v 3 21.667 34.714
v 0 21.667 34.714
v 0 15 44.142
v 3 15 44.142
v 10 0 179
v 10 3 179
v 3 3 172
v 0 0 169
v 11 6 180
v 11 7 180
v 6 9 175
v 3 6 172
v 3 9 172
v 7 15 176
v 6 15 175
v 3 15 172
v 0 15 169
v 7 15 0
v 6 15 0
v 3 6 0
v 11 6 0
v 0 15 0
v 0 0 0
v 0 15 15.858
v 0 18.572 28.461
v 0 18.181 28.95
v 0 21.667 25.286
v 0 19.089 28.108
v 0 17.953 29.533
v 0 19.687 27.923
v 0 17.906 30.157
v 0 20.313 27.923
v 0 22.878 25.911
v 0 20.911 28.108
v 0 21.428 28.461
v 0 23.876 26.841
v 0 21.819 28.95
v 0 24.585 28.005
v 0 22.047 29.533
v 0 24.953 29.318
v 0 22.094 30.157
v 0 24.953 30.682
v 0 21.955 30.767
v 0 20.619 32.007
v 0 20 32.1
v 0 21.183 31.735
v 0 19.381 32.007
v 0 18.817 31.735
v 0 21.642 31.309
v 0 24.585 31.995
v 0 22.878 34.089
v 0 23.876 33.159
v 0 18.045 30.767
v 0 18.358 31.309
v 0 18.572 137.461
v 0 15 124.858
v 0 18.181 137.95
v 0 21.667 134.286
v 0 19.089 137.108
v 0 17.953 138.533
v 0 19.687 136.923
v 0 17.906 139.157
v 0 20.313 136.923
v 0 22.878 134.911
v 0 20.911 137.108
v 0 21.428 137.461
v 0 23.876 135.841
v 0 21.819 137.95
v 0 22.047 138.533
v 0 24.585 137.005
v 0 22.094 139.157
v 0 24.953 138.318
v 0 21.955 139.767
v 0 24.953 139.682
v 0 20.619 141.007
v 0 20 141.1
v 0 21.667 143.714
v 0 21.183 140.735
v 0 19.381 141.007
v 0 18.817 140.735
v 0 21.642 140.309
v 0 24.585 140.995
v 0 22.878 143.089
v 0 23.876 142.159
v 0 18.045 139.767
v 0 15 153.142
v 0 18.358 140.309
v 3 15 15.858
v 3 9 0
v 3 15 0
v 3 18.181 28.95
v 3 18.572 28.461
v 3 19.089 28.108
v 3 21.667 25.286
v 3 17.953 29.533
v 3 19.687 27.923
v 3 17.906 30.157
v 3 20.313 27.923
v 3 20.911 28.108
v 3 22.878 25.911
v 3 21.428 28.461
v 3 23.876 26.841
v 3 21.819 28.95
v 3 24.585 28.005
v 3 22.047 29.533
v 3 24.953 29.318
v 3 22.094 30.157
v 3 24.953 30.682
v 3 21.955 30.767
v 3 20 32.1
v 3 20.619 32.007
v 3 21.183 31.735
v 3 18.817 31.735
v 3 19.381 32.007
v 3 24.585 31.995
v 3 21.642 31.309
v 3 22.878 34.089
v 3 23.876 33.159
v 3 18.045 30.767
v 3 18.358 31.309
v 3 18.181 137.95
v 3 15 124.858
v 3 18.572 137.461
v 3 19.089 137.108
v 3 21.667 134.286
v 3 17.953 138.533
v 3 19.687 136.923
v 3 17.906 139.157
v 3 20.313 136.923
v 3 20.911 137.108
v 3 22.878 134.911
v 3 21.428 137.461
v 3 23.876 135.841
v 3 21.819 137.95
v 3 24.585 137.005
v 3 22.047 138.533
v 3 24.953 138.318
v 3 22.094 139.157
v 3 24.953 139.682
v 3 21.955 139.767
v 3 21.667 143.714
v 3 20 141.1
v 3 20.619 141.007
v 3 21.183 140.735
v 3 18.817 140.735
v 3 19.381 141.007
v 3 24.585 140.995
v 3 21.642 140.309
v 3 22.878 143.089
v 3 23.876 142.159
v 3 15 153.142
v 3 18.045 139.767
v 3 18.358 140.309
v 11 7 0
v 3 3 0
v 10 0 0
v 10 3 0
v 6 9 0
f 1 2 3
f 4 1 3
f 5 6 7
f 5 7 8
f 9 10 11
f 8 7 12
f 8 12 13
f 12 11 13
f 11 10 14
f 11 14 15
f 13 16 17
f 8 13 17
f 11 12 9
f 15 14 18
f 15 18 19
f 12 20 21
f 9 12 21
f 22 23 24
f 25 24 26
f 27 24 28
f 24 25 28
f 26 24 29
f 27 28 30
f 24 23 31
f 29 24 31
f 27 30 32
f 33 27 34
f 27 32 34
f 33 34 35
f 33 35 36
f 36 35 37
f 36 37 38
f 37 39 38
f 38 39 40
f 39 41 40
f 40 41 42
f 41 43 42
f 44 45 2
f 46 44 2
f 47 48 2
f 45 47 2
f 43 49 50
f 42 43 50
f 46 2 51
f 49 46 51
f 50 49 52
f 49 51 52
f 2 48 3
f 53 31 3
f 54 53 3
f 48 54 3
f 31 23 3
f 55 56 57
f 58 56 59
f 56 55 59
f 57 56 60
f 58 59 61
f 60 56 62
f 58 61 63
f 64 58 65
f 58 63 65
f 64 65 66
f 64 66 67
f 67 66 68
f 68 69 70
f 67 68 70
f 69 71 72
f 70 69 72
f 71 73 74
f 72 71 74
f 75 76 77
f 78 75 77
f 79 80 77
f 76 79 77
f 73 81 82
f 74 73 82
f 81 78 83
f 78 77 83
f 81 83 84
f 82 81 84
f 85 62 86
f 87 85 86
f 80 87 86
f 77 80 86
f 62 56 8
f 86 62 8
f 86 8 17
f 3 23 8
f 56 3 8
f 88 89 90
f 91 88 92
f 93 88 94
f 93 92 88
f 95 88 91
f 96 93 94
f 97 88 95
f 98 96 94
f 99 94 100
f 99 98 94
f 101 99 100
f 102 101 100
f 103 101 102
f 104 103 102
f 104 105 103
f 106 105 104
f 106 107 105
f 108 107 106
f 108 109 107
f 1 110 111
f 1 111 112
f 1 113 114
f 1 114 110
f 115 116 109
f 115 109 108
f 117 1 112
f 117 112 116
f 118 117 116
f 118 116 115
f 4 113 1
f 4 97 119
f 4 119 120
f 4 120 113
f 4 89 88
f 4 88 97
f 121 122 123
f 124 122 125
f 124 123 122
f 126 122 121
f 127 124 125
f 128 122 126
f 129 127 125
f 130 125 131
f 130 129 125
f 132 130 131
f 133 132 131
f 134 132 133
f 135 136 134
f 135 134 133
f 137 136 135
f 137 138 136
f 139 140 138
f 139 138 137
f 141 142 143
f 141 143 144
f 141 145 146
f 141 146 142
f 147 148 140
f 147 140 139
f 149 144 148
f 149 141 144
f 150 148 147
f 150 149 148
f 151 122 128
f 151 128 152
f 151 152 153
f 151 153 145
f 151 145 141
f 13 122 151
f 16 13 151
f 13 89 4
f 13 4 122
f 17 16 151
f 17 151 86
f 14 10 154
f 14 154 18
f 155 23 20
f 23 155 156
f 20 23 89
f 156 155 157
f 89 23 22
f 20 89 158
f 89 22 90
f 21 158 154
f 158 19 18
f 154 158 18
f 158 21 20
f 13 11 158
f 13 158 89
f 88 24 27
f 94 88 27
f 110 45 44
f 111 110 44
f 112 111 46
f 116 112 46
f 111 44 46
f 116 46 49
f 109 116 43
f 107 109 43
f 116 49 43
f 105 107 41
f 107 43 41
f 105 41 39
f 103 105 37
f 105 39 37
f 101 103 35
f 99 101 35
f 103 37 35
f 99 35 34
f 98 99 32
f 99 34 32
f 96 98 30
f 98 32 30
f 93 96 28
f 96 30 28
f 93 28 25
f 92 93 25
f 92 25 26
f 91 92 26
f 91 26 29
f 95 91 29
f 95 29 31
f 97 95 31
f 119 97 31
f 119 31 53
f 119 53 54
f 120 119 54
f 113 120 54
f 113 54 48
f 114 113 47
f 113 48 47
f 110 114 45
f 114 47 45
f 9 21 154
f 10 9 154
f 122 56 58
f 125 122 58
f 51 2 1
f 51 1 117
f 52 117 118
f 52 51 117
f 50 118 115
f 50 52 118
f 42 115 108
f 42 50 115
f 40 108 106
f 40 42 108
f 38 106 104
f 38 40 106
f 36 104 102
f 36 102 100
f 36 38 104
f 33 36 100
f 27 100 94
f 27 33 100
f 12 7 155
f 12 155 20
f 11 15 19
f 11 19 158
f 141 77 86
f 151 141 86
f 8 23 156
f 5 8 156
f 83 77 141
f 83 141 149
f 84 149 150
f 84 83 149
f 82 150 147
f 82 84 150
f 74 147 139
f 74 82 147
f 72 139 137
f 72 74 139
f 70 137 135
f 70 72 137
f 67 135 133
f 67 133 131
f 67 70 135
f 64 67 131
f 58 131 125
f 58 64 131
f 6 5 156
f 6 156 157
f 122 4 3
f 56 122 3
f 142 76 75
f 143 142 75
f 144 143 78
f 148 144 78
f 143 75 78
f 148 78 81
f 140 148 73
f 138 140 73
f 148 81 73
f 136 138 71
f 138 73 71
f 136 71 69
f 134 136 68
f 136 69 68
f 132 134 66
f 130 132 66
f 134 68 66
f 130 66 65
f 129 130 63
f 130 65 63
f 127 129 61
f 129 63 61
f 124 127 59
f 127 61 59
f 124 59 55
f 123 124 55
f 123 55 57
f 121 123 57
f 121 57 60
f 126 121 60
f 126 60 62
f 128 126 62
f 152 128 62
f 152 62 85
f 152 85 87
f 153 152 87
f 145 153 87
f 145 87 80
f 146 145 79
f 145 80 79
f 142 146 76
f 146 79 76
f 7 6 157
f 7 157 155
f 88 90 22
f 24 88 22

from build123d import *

# Parameters (mm, degrees)
DODANIE_WYCI_GNI_CIE1_DEPTH = 180
WYTNIJ_WYCI_GNI_CIE1_DEPTH  = 181.958558792
SZKIC3_R                    = 2.1
DODANIE_WYCI_GNI_CIE2_DEPTH = 3
SFAZOWANIE1_DEPTH           = 3


with BuildPart() as part:
    # Szkic1 → Dodanie-wyciągnięcie1 (new body)
    with BuildSketch(Plane.XY):
        Polygon((0, 0), (10, 0), (10, 3), (3, 3), (3, 6), (11, 6), (11, 7), (7, 15), (6, 15), (6, 9), (3, 9), (3, 15), (0, 15), align=None)
    extrude(amount=DODANIE_WYCI_GNI_CIE1_DEPTH)

    # Szkic2 → Wytnij-wyciągnięcie1 (cut, through all)
    with BuildSketch(Plane(origin=(0, 15, 0), x_dir=(1, 0, 0), z_dir=(0, 1, 0))):
        Polygon((0, -180), (11, -180), (0, -169), align=None)
    extrude(amount=-WYTNIJ_WYCI_GNI_CIE1_DEPTH, mode=Mode.SUBTRACT)

    # Szkic3 → Dodanie-wyciągnięcie2 (add)
    # profile 1 of 2: a face of its own
    with BuildSketch(Plane.ZY):
        with BuildLine():
            Line((25, 20), (25, 11.336506418))
            Line((25, 11.336506418), (35, 11.336506418))
            Line((35, 11.336506418), (35, 20))
            ThreePointArc((35, 20), (30, 25), (25, 20))
        make_face()
        with Locations((30, 20)):
            Circle(SZKIC3_R, mode=Mode.SUBTRACT)
    # profile 2 of 2: a face of its own
    with BuildSketch(Plane.ZY):
        with BuildLine():
            Line((134, 20), (134, 11.336506418))
            Line((134, 11.336506418), (144, 11.336506418))
            Line((144, 11.336506418), (144, 20))
            ThreePointArc((144, 20), (139, 25), (134, 20))
        make_face()
        with Locations((139, 20)):
            Circle(SZKIC3_R, mode=Mode.SUBTRACT)
    extrude(amount=-DODANIE_WYCI_GNI_CIE2_DEPTH)

    # Sfazowanie1: read off the stored shape, not the designer's step
    # Sfazowanie1 outline → Sfazowanie1 (add)
    with BuildSketch(Plane.YZ):
        with BuildLine():
            Line((15, 134), (15, 124.857864376))
            Line((15, 124.857864376), (21.666666667, 134.285954792))
            ThreePointArc((21.666666667, 134.285954792), (20.845509894, 134.072007202), (20, 134))
            Line((20, 134), (15, 134))
        make_face()
        with BuildLine():
            Line((15, 15.857864376), (21.666666667, 25.285954792))
            ThreePointArc((21.666666667, 25.285954792), (20.845509894, 25.072007202), (20, 25))
            Line((20, 25), (15, 25))
            Line((15, 25), (15, 15.857864376))
        make_face()
        with BuildLine():
            Line((21.666666667, 34.714045208), (15, 44.142135624))
            Line((15, 44.142135624), (15, 35))
            Line((15, 35), (20, 35))
            ThreePointArc((20, 35), (20.845509894, 34.927992798), (21.666666667, 34.714045208))
        make_face()
        with BuildLine():
            ThreePointArc((20, 144), (20.845509894, 143.927992798), (21.666666667, 143.714045208))
            Line((21.666666667, 143.714045208), (15, 153.142135624))
            Line((15, 153.142135624), (15, 144))
            Line((15, 144), (20, 144))
        make_face()
    extrude(amount=SFAZOWANIE1_DEPTH)


solid = part.part
